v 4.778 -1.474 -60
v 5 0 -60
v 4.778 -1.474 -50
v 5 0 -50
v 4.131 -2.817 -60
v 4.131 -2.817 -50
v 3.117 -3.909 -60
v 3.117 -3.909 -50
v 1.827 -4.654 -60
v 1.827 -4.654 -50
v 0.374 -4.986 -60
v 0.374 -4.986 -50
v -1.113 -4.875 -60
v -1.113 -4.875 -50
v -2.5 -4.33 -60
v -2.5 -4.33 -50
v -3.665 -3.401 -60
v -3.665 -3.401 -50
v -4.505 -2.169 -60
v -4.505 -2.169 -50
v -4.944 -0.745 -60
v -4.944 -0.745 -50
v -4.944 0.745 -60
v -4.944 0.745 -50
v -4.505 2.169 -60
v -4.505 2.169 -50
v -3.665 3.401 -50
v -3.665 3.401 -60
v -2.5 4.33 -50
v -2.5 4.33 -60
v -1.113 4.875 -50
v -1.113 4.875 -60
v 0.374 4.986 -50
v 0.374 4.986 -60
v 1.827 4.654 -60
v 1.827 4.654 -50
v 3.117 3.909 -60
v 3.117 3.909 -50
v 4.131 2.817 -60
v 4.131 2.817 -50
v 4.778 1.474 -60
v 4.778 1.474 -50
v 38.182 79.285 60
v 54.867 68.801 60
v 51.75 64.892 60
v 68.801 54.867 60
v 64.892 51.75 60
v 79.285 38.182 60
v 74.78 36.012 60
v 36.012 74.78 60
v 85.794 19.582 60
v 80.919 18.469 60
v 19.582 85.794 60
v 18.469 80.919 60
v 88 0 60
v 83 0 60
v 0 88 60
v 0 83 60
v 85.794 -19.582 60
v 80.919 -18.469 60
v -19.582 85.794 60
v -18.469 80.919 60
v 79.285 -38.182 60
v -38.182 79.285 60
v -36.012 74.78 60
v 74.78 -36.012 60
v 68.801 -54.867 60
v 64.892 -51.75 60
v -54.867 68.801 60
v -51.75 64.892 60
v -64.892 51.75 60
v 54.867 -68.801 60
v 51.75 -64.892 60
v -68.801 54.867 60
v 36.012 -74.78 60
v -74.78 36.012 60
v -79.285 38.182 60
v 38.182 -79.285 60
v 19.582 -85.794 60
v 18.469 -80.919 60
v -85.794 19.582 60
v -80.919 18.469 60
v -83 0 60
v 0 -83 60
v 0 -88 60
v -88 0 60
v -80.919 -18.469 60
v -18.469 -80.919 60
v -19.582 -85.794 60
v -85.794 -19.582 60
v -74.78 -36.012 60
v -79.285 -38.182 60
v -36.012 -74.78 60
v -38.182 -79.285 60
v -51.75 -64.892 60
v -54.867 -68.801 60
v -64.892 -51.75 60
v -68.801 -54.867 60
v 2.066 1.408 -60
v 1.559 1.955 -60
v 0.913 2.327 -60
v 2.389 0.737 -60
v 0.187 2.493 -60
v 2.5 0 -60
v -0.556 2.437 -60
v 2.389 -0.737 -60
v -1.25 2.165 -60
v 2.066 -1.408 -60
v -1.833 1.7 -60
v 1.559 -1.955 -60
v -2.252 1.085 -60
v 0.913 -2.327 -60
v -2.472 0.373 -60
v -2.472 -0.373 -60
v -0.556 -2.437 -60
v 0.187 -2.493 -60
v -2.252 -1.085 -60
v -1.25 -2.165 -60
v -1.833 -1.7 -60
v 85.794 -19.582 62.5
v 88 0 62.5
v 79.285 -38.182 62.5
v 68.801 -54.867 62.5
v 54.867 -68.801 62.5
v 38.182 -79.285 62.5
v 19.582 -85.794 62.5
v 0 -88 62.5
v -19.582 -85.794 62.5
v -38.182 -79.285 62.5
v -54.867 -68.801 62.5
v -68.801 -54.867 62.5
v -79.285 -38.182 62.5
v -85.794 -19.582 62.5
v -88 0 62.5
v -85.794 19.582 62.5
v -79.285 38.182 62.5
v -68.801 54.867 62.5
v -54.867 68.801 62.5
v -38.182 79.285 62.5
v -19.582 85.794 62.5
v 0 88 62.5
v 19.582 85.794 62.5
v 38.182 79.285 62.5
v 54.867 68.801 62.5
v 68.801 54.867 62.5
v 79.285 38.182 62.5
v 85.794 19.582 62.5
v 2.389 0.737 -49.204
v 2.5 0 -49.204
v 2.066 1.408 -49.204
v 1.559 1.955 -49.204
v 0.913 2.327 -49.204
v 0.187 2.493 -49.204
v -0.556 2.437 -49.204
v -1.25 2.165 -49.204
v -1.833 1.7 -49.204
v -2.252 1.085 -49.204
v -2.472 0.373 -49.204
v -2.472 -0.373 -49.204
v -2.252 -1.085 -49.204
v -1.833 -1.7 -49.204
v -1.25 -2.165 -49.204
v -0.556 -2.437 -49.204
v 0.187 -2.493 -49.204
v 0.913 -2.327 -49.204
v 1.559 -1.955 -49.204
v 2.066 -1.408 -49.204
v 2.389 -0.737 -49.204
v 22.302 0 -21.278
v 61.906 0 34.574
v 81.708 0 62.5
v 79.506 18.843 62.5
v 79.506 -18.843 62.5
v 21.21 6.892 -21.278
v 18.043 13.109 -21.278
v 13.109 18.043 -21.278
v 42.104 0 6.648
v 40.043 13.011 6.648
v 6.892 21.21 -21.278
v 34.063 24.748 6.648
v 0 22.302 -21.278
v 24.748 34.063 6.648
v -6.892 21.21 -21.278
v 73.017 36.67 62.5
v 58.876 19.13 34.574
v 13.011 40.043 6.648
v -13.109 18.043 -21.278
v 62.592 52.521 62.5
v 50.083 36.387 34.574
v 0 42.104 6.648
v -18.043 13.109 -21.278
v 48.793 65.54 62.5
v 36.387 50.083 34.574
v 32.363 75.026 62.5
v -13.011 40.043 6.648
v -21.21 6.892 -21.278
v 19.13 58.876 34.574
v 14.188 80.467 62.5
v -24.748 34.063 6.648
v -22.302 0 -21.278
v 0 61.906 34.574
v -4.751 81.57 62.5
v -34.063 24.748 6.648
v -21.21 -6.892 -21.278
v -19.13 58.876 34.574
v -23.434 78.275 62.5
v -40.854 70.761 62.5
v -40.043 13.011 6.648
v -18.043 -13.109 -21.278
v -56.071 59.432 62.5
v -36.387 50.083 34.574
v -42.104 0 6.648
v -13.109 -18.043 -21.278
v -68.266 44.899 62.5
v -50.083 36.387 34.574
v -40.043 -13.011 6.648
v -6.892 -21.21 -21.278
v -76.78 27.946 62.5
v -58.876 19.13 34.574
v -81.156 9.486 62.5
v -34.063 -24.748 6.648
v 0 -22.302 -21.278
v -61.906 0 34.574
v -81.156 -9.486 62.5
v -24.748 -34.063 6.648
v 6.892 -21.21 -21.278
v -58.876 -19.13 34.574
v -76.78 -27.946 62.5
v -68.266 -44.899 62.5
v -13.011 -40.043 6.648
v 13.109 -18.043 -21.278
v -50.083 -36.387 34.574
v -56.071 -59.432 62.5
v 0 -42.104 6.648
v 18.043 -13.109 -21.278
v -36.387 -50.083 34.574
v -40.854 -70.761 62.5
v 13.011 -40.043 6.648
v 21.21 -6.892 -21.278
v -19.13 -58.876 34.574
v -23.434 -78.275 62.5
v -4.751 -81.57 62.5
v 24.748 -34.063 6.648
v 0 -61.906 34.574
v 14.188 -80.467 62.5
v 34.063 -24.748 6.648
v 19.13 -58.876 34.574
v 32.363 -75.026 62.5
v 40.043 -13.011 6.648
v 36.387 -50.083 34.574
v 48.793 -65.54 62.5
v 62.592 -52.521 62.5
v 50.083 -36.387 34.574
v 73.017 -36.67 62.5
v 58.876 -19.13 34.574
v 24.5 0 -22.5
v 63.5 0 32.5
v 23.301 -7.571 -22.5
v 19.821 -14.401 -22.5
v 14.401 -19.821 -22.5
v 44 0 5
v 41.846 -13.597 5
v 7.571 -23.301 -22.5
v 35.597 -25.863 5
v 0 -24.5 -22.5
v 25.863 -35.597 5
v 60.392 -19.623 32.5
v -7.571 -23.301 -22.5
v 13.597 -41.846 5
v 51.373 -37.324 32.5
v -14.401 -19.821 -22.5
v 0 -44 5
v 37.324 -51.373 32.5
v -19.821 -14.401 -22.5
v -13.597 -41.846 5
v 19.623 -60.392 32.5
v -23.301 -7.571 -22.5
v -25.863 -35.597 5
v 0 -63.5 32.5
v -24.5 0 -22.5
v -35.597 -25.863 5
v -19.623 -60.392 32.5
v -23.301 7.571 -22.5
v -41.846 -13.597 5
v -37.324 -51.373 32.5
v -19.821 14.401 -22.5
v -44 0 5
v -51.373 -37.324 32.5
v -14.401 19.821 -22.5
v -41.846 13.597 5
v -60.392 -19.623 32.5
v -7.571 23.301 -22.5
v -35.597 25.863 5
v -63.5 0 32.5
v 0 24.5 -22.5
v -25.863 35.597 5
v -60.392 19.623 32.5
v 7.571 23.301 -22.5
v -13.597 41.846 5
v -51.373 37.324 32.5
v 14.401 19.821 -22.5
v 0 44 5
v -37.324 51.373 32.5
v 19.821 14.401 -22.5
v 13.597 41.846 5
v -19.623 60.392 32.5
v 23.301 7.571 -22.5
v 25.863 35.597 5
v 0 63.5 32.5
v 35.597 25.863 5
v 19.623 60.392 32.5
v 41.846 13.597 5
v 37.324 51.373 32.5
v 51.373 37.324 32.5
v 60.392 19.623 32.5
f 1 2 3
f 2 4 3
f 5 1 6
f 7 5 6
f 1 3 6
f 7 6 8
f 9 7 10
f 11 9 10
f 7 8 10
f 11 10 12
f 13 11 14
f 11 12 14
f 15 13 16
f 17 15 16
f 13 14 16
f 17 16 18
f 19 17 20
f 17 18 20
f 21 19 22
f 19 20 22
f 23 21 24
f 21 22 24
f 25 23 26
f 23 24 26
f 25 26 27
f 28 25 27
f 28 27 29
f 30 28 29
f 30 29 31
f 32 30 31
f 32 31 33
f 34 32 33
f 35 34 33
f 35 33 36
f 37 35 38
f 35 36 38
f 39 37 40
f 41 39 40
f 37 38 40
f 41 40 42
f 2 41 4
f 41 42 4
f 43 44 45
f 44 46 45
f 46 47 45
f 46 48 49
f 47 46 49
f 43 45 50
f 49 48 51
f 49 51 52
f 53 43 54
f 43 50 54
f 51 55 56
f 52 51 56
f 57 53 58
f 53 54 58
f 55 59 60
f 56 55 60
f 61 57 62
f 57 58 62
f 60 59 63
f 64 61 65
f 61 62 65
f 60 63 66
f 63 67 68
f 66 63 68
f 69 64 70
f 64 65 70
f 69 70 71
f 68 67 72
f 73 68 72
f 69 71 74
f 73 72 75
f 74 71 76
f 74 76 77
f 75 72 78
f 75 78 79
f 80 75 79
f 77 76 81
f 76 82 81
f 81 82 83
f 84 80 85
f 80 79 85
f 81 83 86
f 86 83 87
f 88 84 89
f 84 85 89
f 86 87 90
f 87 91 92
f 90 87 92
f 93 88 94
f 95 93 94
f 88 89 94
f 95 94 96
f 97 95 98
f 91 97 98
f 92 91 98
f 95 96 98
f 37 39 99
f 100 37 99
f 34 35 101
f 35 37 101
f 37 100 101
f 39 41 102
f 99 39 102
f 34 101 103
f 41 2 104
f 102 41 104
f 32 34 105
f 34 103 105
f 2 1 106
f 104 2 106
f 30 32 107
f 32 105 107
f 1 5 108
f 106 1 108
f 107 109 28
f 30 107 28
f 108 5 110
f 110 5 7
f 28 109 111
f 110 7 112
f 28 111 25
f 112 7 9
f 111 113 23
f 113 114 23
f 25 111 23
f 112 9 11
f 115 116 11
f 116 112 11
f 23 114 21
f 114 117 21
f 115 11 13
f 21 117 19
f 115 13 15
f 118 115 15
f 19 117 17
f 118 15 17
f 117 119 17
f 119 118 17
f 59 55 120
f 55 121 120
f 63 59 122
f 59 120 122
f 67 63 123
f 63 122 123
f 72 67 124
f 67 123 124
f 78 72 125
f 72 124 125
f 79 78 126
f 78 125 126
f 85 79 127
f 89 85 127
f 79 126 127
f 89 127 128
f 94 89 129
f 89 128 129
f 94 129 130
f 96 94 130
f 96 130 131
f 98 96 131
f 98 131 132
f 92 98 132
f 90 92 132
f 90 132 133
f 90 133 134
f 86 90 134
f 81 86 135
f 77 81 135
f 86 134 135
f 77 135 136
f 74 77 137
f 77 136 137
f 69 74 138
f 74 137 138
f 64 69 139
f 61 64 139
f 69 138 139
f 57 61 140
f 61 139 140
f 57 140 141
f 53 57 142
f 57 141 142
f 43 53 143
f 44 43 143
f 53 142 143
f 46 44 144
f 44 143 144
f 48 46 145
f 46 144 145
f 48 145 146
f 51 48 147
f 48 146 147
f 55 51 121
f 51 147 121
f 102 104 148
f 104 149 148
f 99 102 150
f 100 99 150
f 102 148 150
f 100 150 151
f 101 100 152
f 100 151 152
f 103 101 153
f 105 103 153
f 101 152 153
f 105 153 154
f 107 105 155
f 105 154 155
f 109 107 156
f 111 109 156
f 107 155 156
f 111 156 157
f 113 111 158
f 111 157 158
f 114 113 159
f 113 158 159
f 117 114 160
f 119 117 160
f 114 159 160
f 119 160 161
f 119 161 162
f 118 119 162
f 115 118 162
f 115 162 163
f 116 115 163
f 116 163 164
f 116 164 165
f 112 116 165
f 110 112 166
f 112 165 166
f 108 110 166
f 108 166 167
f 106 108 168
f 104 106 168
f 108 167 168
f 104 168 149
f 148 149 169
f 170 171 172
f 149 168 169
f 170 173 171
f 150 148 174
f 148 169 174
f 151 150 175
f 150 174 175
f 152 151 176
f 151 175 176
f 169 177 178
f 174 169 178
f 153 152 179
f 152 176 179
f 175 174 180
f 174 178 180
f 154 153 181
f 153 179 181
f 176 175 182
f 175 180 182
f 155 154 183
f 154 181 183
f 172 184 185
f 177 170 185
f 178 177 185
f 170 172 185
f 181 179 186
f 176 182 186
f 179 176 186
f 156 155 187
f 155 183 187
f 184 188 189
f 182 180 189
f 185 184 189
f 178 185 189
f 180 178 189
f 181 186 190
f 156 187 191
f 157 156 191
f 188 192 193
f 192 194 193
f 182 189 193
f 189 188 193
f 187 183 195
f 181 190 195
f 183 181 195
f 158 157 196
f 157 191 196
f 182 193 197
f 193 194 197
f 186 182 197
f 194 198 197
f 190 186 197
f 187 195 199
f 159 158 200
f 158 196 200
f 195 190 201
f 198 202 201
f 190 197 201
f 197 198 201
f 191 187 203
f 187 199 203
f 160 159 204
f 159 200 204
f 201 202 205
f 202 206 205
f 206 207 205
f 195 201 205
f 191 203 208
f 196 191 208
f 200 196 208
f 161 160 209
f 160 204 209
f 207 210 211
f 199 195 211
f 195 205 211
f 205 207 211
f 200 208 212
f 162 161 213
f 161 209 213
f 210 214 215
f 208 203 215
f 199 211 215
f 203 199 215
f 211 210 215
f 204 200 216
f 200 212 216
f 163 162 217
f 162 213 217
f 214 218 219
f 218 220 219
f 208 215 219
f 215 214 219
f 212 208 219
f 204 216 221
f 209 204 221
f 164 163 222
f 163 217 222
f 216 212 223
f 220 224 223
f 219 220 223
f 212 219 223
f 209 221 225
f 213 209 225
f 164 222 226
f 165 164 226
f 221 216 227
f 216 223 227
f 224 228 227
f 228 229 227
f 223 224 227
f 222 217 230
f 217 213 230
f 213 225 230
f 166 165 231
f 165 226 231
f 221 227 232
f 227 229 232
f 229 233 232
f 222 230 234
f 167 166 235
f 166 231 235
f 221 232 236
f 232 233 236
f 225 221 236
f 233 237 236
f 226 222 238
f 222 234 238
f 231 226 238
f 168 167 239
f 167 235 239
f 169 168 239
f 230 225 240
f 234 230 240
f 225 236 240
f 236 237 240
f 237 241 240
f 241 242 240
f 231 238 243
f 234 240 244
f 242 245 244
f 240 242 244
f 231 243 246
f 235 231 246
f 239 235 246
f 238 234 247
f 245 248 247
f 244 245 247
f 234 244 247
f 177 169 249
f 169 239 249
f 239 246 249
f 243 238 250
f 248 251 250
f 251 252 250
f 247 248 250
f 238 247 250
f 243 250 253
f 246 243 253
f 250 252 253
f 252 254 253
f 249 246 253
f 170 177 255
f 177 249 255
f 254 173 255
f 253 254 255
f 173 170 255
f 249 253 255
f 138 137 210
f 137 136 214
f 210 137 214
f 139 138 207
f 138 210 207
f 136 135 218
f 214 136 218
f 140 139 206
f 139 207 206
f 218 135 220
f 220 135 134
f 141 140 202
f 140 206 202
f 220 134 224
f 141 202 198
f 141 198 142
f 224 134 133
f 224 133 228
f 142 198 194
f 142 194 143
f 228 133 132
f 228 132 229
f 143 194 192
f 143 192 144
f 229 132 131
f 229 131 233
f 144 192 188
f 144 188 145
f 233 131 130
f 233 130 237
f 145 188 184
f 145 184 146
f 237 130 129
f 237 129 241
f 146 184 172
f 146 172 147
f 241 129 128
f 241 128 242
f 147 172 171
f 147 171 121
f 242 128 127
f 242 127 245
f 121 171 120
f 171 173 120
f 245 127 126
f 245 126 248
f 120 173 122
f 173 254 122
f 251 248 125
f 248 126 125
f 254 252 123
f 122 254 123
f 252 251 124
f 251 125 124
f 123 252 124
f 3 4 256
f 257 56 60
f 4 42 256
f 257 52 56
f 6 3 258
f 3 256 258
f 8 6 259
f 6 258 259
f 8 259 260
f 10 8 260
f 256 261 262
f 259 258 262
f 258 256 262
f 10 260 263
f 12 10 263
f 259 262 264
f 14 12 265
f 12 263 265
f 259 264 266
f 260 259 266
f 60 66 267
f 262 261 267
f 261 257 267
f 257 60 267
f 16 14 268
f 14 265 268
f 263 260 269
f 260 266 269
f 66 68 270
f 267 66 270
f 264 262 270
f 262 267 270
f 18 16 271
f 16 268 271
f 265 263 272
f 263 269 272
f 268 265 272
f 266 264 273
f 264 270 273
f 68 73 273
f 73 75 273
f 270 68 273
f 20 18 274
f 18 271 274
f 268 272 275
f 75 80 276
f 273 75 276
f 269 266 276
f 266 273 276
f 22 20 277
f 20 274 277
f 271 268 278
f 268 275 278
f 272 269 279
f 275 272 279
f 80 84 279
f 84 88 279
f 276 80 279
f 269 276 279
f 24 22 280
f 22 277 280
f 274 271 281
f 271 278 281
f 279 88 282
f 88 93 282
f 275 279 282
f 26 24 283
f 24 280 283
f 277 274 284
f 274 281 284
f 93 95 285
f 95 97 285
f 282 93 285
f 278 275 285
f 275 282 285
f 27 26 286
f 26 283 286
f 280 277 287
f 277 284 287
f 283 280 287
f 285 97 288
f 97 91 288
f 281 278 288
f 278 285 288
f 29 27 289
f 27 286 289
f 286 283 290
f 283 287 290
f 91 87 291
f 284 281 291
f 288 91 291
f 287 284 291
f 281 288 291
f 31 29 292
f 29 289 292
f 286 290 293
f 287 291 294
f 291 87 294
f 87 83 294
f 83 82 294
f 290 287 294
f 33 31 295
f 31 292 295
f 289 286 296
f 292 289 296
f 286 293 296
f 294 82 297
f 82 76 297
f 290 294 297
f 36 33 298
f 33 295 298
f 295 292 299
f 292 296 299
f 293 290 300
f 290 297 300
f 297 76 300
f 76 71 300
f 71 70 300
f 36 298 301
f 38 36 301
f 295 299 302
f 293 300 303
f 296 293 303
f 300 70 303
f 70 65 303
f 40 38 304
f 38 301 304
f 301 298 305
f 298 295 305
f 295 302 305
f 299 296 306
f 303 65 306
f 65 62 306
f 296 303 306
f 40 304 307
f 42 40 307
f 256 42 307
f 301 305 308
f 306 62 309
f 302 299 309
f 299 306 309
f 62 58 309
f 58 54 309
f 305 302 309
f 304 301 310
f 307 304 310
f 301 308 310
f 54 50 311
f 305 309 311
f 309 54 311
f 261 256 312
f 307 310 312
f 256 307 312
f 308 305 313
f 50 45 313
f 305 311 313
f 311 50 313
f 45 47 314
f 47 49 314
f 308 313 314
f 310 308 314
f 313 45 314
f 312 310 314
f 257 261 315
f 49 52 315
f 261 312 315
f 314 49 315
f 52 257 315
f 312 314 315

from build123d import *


# Read off the part's stored shape, not the designer's step: Vaciado1
with BuildPart() as part:
    # Croquis1 → Revolución2 (revolve)
    with BuildSketch(Plane(origin=(0, 0, 0), x_dir=(1, 0, 0), z_dir=(0, 1, 0)), mode=Mode.PRIVATE) as revoluci_n2_sk:
        Polygon((0, -60), (0, 60), (-5, 60), (-5, 50), (-83, -60), (-88, -60), (-88, -62.5), (0, -62.5), align=None)
    revolve(revoluci_n2_sk.sketch.rotate(Axis((0, 0, 60), (0, 0, -1)), 180), axis=Axis((0, 0, 60), (0, 0, -1)))

    # Vaciado1 outline → Vaciado1 (revolve, cut)
    with BuildSketch(Plane.XZ):
        Polygon((0, -60), (2.5, -60), (2.5, -49.203587736), (81.707998576, 62.5), (0, 62.5), align=None)
    revolve(axis=Axis((0, 0, 0), (0, 0, 1)), mode=Mode.SUBTRACT)


solid = part.part
